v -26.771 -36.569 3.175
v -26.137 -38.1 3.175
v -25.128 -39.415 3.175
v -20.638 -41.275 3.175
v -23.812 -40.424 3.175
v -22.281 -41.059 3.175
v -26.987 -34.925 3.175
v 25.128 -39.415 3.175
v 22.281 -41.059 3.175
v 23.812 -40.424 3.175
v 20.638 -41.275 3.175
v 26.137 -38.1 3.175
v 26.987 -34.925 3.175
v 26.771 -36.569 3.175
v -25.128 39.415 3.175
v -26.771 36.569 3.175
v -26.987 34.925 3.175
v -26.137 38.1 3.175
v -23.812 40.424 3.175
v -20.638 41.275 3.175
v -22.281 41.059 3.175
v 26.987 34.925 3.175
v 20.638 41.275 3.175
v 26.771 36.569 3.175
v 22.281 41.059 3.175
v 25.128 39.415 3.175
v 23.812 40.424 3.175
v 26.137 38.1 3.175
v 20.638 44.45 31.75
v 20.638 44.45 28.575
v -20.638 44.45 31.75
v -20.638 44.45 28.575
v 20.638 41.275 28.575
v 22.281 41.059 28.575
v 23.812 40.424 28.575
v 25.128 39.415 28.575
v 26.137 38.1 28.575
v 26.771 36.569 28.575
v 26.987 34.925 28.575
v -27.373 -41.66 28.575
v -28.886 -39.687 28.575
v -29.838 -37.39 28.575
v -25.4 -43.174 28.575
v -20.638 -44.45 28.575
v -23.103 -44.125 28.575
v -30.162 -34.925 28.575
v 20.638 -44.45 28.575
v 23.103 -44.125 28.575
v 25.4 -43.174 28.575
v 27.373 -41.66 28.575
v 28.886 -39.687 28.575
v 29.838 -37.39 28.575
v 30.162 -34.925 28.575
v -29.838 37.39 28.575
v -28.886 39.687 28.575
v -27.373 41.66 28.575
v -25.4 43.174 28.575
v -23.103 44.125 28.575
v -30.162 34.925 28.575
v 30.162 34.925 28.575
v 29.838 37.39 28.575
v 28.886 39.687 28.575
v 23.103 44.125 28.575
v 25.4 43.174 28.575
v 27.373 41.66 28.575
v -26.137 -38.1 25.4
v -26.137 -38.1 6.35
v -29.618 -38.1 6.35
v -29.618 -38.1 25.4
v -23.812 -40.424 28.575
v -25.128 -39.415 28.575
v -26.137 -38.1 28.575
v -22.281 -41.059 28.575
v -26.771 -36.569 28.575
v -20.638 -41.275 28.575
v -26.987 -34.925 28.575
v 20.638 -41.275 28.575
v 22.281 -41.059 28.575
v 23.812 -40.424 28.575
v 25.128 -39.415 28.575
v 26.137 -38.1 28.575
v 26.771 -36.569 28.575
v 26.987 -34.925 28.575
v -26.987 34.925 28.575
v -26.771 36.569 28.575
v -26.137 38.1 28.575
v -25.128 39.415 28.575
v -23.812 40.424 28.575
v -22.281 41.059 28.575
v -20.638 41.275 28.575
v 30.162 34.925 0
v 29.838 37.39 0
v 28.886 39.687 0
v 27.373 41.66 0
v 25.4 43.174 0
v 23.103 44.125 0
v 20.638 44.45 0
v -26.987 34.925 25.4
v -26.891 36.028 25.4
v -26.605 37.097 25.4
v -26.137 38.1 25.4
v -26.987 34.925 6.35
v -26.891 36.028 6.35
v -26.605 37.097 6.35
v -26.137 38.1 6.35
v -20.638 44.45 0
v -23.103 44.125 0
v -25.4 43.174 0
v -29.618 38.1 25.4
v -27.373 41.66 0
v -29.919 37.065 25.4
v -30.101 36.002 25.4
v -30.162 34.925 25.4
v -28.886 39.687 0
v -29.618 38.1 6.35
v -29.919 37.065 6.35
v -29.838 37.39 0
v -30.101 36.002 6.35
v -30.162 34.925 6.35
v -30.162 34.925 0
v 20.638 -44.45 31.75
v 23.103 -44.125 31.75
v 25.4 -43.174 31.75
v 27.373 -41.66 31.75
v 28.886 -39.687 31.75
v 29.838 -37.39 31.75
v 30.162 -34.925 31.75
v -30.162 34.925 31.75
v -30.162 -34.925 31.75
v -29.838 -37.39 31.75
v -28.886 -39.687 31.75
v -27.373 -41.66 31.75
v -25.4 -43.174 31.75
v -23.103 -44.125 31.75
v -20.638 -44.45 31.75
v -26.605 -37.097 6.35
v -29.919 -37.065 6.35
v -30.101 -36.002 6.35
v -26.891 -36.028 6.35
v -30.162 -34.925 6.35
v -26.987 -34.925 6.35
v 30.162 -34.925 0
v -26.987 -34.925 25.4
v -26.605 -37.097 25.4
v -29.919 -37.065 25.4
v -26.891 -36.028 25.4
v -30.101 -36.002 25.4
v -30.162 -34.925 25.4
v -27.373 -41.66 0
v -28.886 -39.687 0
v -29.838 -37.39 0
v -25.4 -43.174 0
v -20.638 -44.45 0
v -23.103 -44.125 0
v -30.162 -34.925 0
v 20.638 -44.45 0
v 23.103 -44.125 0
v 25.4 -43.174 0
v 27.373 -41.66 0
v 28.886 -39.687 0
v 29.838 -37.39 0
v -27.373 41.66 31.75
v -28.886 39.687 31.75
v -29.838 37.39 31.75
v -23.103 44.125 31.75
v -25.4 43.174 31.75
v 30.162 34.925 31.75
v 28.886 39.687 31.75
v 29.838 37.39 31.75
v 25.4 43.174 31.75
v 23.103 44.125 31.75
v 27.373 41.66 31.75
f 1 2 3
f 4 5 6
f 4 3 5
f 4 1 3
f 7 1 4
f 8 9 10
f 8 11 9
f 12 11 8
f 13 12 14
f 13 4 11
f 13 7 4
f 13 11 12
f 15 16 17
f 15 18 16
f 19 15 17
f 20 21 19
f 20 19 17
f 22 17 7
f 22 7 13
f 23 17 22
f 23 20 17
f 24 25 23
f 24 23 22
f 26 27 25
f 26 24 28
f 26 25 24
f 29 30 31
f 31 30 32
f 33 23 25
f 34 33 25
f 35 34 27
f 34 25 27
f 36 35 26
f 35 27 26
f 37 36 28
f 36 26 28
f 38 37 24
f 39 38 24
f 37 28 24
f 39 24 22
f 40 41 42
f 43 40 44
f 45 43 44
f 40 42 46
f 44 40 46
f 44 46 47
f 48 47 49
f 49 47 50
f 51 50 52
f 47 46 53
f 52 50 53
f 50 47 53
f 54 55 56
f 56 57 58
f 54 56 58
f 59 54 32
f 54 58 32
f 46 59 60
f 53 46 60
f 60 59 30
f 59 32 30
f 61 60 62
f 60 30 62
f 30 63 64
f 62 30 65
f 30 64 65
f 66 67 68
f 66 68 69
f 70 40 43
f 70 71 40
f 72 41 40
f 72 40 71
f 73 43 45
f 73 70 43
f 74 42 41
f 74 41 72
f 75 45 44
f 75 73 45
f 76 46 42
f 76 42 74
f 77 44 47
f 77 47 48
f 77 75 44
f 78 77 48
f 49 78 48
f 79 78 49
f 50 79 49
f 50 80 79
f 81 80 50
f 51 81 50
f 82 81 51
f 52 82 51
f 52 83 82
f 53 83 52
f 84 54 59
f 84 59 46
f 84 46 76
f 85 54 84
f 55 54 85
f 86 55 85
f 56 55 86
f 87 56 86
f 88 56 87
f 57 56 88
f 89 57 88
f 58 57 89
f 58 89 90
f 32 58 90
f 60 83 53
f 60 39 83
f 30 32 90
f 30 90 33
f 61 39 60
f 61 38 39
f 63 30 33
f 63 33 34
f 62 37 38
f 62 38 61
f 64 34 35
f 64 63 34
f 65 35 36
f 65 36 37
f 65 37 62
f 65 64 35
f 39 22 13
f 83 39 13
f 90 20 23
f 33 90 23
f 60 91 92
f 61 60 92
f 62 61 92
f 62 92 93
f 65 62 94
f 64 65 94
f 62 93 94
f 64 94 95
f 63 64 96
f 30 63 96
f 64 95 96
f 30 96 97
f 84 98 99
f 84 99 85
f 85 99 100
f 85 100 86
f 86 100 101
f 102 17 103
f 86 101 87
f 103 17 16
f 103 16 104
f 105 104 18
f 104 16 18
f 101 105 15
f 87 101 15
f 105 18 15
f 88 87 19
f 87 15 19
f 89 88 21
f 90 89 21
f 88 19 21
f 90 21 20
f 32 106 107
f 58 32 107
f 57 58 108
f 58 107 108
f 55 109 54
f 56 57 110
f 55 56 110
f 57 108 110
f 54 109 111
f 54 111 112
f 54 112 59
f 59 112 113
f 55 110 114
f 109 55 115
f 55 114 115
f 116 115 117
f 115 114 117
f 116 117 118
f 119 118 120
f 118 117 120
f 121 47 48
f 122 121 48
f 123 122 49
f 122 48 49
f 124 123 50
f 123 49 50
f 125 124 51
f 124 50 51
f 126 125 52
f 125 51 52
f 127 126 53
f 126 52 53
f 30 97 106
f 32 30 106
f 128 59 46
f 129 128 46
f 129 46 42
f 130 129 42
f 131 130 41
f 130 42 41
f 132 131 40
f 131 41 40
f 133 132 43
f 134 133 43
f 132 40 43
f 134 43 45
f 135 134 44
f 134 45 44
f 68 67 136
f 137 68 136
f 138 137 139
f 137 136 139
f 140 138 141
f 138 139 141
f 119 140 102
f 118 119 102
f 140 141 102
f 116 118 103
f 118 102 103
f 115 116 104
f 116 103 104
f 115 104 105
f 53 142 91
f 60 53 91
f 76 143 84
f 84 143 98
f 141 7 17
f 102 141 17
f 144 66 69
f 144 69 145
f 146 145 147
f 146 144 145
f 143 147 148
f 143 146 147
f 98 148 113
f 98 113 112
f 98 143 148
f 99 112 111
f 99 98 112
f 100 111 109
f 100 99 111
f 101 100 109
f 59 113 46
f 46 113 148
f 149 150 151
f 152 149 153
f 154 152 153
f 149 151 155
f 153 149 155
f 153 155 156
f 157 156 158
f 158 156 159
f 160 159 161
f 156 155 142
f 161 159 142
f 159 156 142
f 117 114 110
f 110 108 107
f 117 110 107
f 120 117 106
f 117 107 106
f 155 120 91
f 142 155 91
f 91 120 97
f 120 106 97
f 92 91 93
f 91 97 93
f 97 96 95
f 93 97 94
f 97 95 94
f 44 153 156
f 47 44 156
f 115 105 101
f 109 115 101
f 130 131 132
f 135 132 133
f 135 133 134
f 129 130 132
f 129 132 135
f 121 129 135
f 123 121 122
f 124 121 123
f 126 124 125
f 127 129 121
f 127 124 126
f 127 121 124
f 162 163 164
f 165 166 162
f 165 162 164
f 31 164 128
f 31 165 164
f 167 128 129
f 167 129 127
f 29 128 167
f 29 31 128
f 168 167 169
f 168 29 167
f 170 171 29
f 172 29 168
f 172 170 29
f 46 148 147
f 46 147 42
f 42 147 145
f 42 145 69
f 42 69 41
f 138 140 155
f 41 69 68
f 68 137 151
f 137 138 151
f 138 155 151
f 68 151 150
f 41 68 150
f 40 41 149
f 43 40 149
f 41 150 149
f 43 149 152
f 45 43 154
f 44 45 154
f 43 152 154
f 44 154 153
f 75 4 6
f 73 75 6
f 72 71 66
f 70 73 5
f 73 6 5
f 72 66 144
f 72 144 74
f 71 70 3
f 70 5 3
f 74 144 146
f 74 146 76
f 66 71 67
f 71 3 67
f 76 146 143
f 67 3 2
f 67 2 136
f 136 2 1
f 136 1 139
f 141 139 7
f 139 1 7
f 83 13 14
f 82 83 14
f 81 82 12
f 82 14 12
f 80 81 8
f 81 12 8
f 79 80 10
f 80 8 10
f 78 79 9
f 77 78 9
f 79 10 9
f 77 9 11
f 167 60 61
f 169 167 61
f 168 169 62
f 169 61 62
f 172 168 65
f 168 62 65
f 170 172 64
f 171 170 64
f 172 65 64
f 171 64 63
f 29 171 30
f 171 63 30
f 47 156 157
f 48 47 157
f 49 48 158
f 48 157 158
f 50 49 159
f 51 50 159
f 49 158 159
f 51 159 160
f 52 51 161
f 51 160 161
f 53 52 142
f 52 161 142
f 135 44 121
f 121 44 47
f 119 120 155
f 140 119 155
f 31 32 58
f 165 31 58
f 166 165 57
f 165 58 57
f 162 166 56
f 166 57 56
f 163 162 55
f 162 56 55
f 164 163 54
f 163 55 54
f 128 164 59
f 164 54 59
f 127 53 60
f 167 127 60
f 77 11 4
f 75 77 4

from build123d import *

# Parameters (mm, degrees)
F1_DEPTH = 3.175
F2_DEPTH = 28.575
F3_START = 28.575
F3_DEPTH = 3.175
F4_W     = 76.2
F4_H     = 19.05
F5_DEPTH = 50.8


with BuildPart() as f1:
    # F0 (on Top) → F1 (new body)
    with BuildSketch(Plane.XY):
        with BuildLine():
            Line((-20.6375, -44.45), (20.6375, -44.45))
            ThreePointArc((20.6375, -44.45), (27.3726920908, -41.6601920908), (30.1625, -34.925))
            Line((30.1625, -34.925), (30.1625, 34.925))
            ThreePointArc((30.1625, 34.925), (27.3726920908, 41.6601920908), (20.6375, 44.45))
            Line((20.6375, 44.45), (-20.6375, 44.45))
            ThreePointArc((-20.6375, 44.45), (-27.3726920908, 41.6601920908), (-30.1625, 34.925))
            Line((-30.1625, 34.925), (-30.1625, -34.925))
            ThreePointArc((-30.1625, -34.925), (-27.3726920908, -41.6601920908), (-20.6375, -44.45))
        make_face()
        with BuildLine():
            ThreePointArc((26.9875, -34.925), (25.1276280605, -39.4151280605), (20.6375, -41.275))
            Line((20.6375, -41.275), (-20.6375, -41.275))
            ThreePointArc((-20.6375, -41.275), (-25.1276280605, -39.4151280605), (-26.9875, -34.925))
            Line((-26.9875, -34.925), (-26.9875, 34.925))
            ThreePointArc((-26.9875, 34.925), (-25.1276280605, 39.4151280605), (-20.6375, 41.275))
            Line((-20.6375, 41.275), (20.6375, 41.275))
            ThreePointArc((20.6375, 41.275), (25.1276280605, 39.4151280605), (26.9875, 34.925))
            Line((26.9875, 34.925), (26.9875, -34.925))
        make_face(mode=Mode.SUBTRACT)
        with BuildLine():
            Line((-20.6375, -41.275), (20.6375, -41.275))
            ThreePointArc((20.6375, -41.275), (25.1276280605, -39.4151280605), (26.9875, -34.925))
            Line((26.9875, -34.925), (26.9875, 34.925))
            ThreePointArc((26.9875, 34.925), (25.1276280605, 39.4151280605), (20.6375, 41.275))
            Line((20.6375, 41.275), (-20.6375, 41.275))
            ThreePointArc((-20.6375, 41.275), (-25.1276280605, 39.4151280605), (-26.9875, 34.925))
            Line((-26.9875, 34.925), (-26.9875, -34.925))
            ThreePointArc((-26.9875, -34.925), (-25.1276280605, -39.4151280605), (-20.6375, -41.275))
        make_face()
    extrude(amount=F1_DEPTH)

    # F0 (on Top) → F2 (join)
    with BuildSketch(Plane.XY):
        with BuildLine():
            Line((-20.6375, -44.45), (20.6375, -44.45))
            ThreePointArc((20.6375, -44.45), (27.3726920908, -41.6601920908), (30.1625, -34.925))
            Line((30.1625, -34.925), (30.1625, 34.925))
            ThreePointArc((30.1625, 34.925), (27.3726920908, 41.6601920908), (20.6375, 44.45))
            Line((20.6375, 44.45), (-20.6375, 44.45))
            ThreePointArc((-20.6375, 44.45), (-27.3726920908, 41.6601920908), (-30.1625, 34.925))
            Line((-30.1625, 34.925), (-30.1625, -34.925))
            ThreePointArc((-30.1625, -34.925), (-27.3726920908, -41.6601920908), (-20.6375, -44.45))
        make_face()
        with BuildLine():
            ThreePointArc((26.9875, -34.925), (25.1276280605, -39.4151280605), (20.6375, -41.275))
            Line((20.6375, -41.275), (-20.6375, -41.275))
            ThreePointArc((-20.6375, -41.275), (-25.1276280605, -39.4151280605), (-26.9875, -34.925))
            Line((-26.9875, -34.925), (-26.9875, 34.925))
            ThreePointArc((-26.9875, 34.925), (-25.1276280605, 39.4151280605), (-20.6375, 41.275))
            Line((-20.6375, 41.275), (20.6375, 41.275))
            ThreePointArc((20.6375, 41.275), (25.1276280605, 39.4151280605), (26.9875, 34.925))
            Line((26.9875, 34.925), (26.9875, -34.925))
        make_face(mode=Mode.SUBTRACT)
    extrude(amount=F2_DEPTH)

    # F4 (on Right) → F5 (cut)
    with BuildSketch(Plane.YZ):
        with Locations((0, 15.875)):
            Rectangle(F4_W, F4_H)
    extrude(amount=-F5_DEPTH, mode=Mode.SUBTRACT)


with BuildPart() as f3:
    # F0 (on Top) → F3 (new body)
    with BuildSketch(Plane.XY.offset(F3_START)):
        with BuildLine():
            Line((-20.6375, -44.45), (20.6375, -44.45))
            ThreePointArc((20.6375, -44.45), (27.3726920908, -41.6601920908), (30.1625, -34.925))
            Line((30.1625, -34.925), (30.1625, 34.925))
            ThreePointArc((30.1625, 34.925), (27.3726920908, 41.6601920908), (20.6375, 44.45))
            Line((20.6375, 44.45), (-20.6375, 44.45))
            ThreePointArc((-20.6375, 44.45), (-27.3726920908, 41.6601920908), (-30.1625, 34.925))
            Line((-30.1625, 34.925), (-30.1625, -34.925))
            ThreePointArc((-30.1625, -34.925), (-27.3726920908, -41.6601920908), (-20.6375, -44.45))
        make_face()
        with BuildLine():
            ThreePointArc((26.9875, -34.925), (25.1276280605, -39.4151280605), (20.6375, -41.275))
            Line((20.6375, -41.275), (-20.6375, -41.275))
            ThreePointArc((-20.6375, -41.275), (-25.1276280605, -39.4151280605), (-26.9875, -34.925))
            Line((-26.9875, -34.925), (-26.9875, 34.925))
            ThreePointArc((-26.9875, 34.925), (-25.1276280605, 39.4151280605), (-20.6375, 41.275))
            Line((-20.6375, 41.275), (20.6375, 41.275))
            ThreePointArc((20.6375, 41.275), (25.1276280605, 39.4151280605), (26.9875, 34.925))
            Line((26.9875, 34.925), (26.9875, -34.925))
        make_face(mode=Mode.SUBTRACT)
        with BuildLine():
            Line((-20.6375, -41.275), (20.6375, -41.275))
            ThreePointArc((20.6375, -41.275), (25.1276280605, -39.4151280605), (26.9875, -34.925))
            Line((26.9875, -34.925), (26.9875, 34.925))
            ThreePointArc((26.9875, 34.925), (25.1276280605, 39.4151280605), (20.6375, 41.275))
            Line((20.6375, 41.275), (-20.6375, 41.275))
            ThreePointArc((-20.6375, 41.275), (-25.1276280605, 39.4151280605), (-26.9875, 34.925))
            Line((-26.9875, 34.925), (-26.9875, -34.925))
            ThreePointArc((-26.9875, -34.925), (-25.1276280605, -39.4151280605), (-20.6375, -41.275))
        make_face()
    extrude(amount=F3_DEPTH)


solid = Compound([f1.part, f3.part])
